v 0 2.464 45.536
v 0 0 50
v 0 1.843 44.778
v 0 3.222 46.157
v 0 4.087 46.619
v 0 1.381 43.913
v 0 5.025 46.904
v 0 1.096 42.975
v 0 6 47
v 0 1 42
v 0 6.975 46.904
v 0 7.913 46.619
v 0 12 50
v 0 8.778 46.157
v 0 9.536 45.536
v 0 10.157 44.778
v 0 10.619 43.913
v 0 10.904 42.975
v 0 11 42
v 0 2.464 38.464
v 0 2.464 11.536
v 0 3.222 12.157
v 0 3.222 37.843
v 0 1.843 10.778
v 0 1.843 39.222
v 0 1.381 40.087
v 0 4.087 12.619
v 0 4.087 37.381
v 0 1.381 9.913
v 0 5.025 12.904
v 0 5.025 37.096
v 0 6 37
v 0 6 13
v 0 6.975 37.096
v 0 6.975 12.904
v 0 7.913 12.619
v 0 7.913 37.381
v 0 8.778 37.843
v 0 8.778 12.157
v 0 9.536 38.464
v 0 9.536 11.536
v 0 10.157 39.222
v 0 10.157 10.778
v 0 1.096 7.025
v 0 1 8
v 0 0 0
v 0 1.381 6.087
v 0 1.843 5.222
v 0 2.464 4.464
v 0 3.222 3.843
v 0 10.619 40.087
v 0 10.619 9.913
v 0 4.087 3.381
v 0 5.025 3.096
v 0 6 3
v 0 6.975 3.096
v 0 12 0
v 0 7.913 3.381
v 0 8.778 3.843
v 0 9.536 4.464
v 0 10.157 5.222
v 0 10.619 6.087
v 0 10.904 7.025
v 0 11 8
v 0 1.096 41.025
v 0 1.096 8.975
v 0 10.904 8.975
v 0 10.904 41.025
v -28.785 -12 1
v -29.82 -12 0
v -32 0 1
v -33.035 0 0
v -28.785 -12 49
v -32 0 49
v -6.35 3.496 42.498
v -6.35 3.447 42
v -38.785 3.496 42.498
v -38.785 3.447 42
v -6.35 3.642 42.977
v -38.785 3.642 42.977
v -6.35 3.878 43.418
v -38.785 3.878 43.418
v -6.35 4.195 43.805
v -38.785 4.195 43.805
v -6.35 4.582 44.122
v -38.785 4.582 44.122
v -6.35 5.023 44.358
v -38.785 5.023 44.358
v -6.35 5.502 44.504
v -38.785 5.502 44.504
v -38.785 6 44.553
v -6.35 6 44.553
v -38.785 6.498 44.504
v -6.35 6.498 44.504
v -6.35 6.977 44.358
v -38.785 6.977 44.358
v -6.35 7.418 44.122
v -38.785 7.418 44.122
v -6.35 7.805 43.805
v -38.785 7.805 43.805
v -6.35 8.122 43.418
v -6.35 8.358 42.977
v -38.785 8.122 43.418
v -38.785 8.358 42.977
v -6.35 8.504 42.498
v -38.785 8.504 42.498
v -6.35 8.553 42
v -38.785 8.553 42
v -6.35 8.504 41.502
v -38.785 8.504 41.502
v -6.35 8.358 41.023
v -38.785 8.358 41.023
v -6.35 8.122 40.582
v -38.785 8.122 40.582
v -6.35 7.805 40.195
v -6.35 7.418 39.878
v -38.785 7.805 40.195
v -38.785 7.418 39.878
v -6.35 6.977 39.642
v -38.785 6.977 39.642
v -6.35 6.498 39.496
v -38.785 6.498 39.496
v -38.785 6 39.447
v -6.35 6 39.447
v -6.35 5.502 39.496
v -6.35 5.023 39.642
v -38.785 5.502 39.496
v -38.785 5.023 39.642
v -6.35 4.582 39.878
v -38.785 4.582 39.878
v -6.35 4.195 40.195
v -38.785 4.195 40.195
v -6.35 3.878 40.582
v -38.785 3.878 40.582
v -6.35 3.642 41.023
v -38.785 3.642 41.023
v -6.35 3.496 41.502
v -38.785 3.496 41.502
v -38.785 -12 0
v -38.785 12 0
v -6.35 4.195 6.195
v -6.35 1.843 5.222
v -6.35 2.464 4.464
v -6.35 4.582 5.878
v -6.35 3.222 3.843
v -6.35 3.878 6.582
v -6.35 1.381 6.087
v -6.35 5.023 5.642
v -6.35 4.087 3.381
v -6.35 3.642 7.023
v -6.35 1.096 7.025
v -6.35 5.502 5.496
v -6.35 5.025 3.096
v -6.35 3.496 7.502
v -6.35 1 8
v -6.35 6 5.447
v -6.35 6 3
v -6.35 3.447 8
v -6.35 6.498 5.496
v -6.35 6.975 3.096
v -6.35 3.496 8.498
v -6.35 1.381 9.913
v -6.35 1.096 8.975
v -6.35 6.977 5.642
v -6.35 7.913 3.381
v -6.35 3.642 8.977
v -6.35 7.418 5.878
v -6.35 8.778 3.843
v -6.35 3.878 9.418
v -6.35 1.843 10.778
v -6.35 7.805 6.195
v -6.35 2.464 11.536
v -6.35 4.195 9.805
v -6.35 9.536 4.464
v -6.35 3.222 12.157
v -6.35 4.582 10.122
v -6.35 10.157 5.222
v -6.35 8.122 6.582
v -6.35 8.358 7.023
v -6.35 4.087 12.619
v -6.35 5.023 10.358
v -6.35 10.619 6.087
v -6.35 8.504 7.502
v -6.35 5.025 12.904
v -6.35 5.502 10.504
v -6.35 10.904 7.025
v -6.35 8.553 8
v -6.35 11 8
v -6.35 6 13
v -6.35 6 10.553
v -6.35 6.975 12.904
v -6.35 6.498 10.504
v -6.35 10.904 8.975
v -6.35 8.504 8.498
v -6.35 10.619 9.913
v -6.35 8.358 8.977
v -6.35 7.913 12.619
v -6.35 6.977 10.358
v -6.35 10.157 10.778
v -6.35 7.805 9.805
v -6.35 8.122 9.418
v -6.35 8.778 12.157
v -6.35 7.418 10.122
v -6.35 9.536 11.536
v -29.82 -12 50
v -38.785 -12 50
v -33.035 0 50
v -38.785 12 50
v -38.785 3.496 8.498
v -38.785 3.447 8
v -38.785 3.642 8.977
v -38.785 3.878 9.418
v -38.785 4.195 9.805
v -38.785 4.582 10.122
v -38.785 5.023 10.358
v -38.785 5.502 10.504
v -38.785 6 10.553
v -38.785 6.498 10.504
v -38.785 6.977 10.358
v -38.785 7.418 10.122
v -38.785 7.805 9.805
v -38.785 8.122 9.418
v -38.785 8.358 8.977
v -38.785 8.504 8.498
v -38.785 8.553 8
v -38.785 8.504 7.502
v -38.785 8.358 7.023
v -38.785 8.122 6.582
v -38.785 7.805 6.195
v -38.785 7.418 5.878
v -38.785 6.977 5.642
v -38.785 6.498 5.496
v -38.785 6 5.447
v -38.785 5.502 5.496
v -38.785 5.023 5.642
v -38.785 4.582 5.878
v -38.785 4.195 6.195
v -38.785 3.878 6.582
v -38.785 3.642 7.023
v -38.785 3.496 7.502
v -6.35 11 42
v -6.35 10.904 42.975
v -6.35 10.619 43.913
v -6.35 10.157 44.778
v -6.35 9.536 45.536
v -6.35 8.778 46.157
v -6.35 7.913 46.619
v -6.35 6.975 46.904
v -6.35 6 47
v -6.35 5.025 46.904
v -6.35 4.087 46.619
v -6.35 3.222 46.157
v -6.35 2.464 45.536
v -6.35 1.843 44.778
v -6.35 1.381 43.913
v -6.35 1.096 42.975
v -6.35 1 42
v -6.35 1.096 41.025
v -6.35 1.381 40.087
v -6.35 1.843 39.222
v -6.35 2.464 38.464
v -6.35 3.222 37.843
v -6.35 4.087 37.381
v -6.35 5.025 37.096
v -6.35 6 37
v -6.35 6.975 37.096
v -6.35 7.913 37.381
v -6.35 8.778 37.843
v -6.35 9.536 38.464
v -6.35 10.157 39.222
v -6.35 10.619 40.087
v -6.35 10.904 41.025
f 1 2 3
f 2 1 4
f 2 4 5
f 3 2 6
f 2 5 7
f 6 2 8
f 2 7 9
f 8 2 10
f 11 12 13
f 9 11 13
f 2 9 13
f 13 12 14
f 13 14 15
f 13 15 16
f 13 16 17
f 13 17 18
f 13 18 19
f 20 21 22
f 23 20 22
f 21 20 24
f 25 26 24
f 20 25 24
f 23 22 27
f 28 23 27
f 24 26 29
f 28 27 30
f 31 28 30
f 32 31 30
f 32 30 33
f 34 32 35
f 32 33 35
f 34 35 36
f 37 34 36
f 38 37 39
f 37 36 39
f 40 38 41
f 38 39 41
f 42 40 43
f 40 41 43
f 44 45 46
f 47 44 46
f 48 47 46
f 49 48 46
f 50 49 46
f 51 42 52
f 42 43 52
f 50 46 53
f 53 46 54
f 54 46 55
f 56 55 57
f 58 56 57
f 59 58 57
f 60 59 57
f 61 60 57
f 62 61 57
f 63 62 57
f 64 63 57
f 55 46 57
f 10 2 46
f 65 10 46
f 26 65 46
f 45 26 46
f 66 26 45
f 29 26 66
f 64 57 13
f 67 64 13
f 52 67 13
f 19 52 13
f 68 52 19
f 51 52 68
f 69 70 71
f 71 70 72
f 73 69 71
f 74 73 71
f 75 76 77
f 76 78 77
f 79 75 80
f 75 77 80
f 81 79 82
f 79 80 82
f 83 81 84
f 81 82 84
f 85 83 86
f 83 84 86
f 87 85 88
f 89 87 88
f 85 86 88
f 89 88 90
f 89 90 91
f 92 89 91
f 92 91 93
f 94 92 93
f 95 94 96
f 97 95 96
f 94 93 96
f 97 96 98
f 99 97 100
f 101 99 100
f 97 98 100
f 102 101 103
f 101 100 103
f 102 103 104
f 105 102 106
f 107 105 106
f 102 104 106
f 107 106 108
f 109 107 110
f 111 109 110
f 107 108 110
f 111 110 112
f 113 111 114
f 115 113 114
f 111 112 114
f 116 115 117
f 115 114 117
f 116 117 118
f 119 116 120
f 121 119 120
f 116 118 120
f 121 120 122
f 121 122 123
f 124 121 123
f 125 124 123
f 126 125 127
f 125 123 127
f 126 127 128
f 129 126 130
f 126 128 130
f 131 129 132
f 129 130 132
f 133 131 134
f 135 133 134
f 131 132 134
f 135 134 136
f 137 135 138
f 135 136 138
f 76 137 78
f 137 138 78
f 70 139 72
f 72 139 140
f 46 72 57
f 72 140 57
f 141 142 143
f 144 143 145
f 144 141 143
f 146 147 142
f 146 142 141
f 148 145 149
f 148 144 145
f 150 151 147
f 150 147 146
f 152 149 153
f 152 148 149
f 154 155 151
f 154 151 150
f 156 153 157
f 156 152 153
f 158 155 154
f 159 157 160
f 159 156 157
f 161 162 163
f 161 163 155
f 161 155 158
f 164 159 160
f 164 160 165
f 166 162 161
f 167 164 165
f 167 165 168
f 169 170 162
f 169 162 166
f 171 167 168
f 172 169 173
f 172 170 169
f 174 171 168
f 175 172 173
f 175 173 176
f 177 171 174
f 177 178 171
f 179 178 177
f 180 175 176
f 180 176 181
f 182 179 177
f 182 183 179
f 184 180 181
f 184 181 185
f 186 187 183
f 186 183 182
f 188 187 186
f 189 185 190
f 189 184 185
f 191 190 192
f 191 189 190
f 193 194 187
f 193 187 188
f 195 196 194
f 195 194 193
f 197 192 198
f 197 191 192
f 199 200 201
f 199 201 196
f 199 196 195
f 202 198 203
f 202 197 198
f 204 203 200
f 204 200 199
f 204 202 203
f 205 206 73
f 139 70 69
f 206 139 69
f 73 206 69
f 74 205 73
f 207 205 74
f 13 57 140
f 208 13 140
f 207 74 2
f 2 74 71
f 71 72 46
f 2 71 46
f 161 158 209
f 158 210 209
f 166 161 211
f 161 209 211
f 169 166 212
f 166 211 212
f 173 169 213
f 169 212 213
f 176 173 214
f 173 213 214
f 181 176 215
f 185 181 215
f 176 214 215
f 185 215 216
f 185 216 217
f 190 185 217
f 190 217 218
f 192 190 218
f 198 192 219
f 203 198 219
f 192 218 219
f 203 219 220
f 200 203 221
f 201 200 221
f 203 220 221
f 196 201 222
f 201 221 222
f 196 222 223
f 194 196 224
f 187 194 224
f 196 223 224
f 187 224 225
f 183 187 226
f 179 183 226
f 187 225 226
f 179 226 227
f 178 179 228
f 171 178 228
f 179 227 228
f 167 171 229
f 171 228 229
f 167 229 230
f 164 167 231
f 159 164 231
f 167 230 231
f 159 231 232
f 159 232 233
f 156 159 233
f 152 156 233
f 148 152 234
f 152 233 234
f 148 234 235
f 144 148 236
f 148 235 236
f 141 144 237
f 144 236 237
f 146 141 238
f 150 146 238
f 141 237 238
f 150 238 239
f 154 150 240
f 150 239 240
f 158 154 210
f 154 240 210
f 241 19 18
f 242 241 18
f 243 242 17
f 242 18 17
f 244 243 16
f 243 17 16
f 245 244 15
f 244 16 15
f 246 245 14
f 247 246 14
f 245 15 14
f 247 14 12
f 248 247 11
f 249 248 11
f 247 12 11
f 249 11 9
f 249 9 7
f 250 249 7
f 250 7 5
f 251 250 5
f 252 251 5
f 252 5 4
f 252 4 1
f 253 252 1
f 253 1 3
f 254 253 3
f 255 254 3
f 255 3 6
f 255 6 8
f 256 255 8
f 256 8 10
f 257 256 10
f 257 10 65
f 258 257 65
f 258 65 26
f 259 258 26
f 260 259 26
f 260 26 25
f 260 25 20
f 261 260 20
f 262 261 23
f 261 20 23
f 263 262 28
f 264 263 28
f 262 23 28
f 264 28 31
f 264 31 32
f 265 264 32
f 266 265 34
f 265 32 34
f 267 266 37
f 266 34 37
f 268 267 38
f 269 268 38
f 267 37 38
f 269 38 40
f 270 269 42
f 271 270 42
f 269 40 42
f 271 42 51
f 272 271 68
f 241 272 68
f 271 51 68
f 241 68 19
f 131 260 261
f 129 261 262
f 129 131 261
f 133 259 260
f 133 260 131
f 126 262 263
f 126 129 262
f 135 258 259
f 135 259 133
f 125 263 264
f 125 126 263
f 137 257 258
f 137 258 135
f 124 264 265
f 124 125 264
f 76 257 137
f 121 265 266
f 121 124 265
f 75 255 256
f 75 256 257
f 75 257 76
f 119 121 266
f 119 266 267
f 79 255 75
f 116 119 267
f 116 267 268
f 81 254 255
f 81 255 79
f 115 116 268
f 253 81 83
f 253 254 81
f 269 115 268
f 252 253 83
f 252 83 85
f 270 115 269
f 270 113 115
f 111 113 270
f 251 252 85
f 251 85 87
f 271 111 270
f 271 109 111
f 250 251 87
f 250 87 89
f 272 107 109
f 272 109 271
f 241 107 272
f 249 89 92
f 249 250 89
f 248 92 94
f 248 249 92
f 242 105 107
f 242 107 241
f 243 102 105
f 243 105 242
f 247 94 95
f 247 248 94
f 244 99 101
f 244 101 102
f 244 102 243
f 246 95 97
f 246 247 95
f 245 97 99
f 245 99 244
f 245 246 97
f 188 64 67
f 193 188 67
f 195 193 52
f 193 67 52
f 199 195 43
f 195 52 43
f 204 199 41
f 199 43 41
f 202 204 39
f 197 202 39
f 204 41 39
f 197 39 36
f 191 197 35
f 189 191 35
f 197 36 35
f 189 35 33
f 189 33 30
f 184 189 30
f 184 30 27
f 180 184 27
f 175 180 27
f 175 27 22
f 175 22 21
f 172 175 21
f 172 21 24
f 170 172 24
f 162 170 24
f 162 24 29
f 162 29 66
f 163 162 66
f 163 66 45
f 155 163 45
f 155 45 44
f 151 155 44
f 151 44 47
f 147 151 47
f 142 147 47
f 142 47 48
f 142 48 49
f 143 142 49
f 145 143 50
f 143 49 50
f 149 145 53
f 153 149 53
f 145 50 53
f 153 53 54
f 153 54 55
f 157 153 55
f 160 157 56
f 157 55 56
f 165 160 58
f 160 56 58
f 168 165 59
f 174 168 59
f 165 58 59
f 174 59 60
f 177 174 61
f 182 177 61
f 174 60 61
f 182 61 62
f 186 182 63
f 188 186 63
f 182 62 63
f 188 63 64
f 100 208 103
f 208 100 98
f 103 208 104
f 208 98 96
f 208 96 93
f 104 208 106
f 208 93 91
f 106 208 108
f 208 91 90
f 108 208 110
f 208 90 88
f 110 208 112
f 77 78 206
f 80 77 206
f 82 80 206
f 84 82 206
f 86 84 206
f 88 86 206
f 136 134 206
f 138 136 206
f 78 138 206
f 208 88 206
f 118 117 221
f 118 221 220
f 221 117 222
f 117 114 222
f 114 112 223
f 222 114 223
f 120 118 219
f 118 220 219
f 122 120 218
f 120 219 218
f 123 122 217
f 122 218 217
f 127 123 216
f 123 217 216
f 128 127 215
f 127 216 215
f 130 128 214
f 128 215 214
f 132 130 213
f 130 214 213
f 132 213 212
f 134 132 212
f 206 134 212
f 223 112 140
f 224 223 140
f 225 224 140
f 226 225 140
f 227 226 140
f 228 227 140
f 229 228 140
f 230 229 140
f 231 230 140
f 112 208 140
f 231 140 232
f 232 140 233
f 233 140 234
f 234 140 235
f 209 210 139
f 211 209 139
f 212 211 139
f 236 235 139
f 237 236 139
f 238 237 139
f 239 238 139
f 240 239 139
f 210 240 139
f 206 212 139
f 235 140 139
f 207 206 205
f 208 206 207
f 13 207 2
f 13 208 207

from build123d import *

# Parameters (mm, degrees)
F1_DEPTH       = 50
F3_D           = 5.1054
F3_CBORE_D     = 10
F3_CBORE_DEPTH = 6.35
F4_SIZE        = 1


with BuildPart() as f1:
    # F0 (on Top) → F1 (new body)
    with BuildSketch(Plane.XY):
        Polygon((-32, 0), (0, 0), (0, 12), (-38.78461, 12), (-38.78461, -12), (-28.78461, -12), align=None)
    extrude(amount=F1_DEPTH)

    # F3 (through all)
    with Locations(Plane.YZ):
        with Locations((6, 42), (6, 8)):
            CounterBoreHole(F3_D / 2, F3_CBORE_D / 2, F3_CBORE_DEPTH)

    # F4
    f4_edges = [f1.edges().sort_by_distance(p)[0] for p in [
        (-30.392305, -6, 50),
        (-30.392305, -6, 0),
    ]]
    chamfer(f4_edges, length=F4_SIZE)


solid = f1.part
